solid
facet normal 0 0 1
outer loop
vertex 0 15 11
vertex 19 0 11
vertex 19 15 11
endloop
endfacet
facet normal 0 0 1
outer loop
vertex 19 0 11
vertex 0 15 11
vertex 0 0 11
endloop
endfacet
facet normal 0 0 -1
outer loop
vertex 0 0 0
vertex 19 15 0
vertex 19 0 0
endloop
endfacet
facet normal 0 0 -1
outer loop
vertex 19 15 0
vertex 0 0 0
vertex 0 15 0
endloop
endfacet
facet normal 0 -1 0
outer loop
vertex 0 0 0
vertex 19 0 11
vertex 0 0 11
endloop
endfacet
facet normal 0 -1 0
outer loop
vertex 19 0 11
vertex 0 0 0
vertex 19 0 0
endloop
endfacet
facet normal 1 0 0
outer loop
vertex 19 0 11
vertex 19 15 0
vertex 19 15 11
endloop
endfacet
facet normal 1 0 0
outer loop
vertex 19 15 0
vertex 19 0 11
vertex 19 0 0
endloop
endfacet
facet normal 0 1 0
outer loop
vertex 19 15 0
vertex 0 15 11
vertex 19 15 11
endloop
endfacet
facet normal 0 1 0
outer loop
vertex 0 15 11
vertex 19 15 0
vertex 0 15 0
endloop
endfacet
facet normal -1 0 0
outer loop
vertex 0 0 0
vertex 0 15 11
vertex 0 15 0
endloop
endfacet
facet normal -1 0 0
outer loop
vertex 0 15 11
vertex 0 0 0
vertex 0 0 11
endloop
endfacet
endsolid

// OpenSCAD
// Generated by SolidPython 1.0.1 on 2020-07-29 00:46:56


cube(size = [19, 15, 11]);
/***********************************************
*********      SolidPython code:      **********
************************************************
 
# import packages: SolidPython
from solid import *
from solid.utils import *
from itertools import chain, combinations, permutations


class Resize:

    def __init__(self, scad_file):
        self.scad_file = scad_file
        #self.scad_file = import_scad(scad_file)
        # cone/cylinder param:
        self.r1 = 0
        self.r2 = 0
        self.h = 0
        # rectangular prism param:
        self.w = 0
        self.l = 0
        # ellipse param:
        self.r = 0

    # import OpenScad code (file name corresponds to shape)


    # classify shape + parameters
    def assign(self, param1, param2, param3):
        if self.scad_file == 'cone.scad':
            self.r1 = param1
            self.r2 = param2
            self.h = param3
        elif self.scad_file == 'cylinder.scad':
            self.r1 = param1
            self.r2 = param2
            self.h = param3
        elif self.scad_file == 'rectangularPrism.scad':
            self.h = param1
            self.l = param2
            self.w = param3
        else:
            self.r = param1
            self.h = param2

    # resize parameters
    def iterate(self):
        x = range(3, 20, 2)
        i = 1
        if self.scad_file == 'cone.scad':
            tempList = list(permutations(x, 2))
            for temp in tempList:
                param1 = temp[0]
                param2 = temp[1]
                filepath = 'produced_scad_files/' + 'cone' + str(param1) + '_' + str(param2) + '_' + '.scad'
                scad_render_to_file(cylinder(h=param1, r1=param2, r2=0), filepath)

        elif self.scad_file == 'cylinder.scad':
            tempList = list(permutations(x, 3))
            for temp in tempList:
                param1 = temp[0]
                param2 = temp[1]
                filepath = 'produced_scad_files/' + 'cylinder' + str(param1) + '_' + str(param2) + '_' + '.scad'
                scad_render_to_file(cylinder(h=param1, r1=param2, r2=param2), filepath)

        elif self.scad_file == 'rectangularPrism.scad':
            tempList = list(permutations(x, 3))
            for temp in tempList:
                param1 = temp[0]
                param2 = temp[1]
                param3 = temp[2]
                filepath = 'produced_scad_files/' + 'rectangularPrism' + str(param1) + '_' + str(param2) + '_' + str(
                    param3) + '.scad'
                scad_render_to_file(cube(size=(param1, param2, param3)), filepath)

        elif self.scad_file == 'ellipse.scad':
            tempList = list(permutations(x, 4))
            for temp in tempList:
                param1 = temp[0]
                param2 = temp[1]
                param3 = temp[2]
                param4 = temp[3]
                filepath = 'produced_scad_files/' + 'ellipse' + str(param1) + '_' + str(param2) + '_' + str(param3) + '_' + str(param4) + '.scad'
                scad_render_to_file(scale([param1, param2, param3])(sphere(r=param4)), filepath)

    def render_to_scadfile(self):
        scad_render_to_file(scad, 'example.scad') 
 
************************************************/
